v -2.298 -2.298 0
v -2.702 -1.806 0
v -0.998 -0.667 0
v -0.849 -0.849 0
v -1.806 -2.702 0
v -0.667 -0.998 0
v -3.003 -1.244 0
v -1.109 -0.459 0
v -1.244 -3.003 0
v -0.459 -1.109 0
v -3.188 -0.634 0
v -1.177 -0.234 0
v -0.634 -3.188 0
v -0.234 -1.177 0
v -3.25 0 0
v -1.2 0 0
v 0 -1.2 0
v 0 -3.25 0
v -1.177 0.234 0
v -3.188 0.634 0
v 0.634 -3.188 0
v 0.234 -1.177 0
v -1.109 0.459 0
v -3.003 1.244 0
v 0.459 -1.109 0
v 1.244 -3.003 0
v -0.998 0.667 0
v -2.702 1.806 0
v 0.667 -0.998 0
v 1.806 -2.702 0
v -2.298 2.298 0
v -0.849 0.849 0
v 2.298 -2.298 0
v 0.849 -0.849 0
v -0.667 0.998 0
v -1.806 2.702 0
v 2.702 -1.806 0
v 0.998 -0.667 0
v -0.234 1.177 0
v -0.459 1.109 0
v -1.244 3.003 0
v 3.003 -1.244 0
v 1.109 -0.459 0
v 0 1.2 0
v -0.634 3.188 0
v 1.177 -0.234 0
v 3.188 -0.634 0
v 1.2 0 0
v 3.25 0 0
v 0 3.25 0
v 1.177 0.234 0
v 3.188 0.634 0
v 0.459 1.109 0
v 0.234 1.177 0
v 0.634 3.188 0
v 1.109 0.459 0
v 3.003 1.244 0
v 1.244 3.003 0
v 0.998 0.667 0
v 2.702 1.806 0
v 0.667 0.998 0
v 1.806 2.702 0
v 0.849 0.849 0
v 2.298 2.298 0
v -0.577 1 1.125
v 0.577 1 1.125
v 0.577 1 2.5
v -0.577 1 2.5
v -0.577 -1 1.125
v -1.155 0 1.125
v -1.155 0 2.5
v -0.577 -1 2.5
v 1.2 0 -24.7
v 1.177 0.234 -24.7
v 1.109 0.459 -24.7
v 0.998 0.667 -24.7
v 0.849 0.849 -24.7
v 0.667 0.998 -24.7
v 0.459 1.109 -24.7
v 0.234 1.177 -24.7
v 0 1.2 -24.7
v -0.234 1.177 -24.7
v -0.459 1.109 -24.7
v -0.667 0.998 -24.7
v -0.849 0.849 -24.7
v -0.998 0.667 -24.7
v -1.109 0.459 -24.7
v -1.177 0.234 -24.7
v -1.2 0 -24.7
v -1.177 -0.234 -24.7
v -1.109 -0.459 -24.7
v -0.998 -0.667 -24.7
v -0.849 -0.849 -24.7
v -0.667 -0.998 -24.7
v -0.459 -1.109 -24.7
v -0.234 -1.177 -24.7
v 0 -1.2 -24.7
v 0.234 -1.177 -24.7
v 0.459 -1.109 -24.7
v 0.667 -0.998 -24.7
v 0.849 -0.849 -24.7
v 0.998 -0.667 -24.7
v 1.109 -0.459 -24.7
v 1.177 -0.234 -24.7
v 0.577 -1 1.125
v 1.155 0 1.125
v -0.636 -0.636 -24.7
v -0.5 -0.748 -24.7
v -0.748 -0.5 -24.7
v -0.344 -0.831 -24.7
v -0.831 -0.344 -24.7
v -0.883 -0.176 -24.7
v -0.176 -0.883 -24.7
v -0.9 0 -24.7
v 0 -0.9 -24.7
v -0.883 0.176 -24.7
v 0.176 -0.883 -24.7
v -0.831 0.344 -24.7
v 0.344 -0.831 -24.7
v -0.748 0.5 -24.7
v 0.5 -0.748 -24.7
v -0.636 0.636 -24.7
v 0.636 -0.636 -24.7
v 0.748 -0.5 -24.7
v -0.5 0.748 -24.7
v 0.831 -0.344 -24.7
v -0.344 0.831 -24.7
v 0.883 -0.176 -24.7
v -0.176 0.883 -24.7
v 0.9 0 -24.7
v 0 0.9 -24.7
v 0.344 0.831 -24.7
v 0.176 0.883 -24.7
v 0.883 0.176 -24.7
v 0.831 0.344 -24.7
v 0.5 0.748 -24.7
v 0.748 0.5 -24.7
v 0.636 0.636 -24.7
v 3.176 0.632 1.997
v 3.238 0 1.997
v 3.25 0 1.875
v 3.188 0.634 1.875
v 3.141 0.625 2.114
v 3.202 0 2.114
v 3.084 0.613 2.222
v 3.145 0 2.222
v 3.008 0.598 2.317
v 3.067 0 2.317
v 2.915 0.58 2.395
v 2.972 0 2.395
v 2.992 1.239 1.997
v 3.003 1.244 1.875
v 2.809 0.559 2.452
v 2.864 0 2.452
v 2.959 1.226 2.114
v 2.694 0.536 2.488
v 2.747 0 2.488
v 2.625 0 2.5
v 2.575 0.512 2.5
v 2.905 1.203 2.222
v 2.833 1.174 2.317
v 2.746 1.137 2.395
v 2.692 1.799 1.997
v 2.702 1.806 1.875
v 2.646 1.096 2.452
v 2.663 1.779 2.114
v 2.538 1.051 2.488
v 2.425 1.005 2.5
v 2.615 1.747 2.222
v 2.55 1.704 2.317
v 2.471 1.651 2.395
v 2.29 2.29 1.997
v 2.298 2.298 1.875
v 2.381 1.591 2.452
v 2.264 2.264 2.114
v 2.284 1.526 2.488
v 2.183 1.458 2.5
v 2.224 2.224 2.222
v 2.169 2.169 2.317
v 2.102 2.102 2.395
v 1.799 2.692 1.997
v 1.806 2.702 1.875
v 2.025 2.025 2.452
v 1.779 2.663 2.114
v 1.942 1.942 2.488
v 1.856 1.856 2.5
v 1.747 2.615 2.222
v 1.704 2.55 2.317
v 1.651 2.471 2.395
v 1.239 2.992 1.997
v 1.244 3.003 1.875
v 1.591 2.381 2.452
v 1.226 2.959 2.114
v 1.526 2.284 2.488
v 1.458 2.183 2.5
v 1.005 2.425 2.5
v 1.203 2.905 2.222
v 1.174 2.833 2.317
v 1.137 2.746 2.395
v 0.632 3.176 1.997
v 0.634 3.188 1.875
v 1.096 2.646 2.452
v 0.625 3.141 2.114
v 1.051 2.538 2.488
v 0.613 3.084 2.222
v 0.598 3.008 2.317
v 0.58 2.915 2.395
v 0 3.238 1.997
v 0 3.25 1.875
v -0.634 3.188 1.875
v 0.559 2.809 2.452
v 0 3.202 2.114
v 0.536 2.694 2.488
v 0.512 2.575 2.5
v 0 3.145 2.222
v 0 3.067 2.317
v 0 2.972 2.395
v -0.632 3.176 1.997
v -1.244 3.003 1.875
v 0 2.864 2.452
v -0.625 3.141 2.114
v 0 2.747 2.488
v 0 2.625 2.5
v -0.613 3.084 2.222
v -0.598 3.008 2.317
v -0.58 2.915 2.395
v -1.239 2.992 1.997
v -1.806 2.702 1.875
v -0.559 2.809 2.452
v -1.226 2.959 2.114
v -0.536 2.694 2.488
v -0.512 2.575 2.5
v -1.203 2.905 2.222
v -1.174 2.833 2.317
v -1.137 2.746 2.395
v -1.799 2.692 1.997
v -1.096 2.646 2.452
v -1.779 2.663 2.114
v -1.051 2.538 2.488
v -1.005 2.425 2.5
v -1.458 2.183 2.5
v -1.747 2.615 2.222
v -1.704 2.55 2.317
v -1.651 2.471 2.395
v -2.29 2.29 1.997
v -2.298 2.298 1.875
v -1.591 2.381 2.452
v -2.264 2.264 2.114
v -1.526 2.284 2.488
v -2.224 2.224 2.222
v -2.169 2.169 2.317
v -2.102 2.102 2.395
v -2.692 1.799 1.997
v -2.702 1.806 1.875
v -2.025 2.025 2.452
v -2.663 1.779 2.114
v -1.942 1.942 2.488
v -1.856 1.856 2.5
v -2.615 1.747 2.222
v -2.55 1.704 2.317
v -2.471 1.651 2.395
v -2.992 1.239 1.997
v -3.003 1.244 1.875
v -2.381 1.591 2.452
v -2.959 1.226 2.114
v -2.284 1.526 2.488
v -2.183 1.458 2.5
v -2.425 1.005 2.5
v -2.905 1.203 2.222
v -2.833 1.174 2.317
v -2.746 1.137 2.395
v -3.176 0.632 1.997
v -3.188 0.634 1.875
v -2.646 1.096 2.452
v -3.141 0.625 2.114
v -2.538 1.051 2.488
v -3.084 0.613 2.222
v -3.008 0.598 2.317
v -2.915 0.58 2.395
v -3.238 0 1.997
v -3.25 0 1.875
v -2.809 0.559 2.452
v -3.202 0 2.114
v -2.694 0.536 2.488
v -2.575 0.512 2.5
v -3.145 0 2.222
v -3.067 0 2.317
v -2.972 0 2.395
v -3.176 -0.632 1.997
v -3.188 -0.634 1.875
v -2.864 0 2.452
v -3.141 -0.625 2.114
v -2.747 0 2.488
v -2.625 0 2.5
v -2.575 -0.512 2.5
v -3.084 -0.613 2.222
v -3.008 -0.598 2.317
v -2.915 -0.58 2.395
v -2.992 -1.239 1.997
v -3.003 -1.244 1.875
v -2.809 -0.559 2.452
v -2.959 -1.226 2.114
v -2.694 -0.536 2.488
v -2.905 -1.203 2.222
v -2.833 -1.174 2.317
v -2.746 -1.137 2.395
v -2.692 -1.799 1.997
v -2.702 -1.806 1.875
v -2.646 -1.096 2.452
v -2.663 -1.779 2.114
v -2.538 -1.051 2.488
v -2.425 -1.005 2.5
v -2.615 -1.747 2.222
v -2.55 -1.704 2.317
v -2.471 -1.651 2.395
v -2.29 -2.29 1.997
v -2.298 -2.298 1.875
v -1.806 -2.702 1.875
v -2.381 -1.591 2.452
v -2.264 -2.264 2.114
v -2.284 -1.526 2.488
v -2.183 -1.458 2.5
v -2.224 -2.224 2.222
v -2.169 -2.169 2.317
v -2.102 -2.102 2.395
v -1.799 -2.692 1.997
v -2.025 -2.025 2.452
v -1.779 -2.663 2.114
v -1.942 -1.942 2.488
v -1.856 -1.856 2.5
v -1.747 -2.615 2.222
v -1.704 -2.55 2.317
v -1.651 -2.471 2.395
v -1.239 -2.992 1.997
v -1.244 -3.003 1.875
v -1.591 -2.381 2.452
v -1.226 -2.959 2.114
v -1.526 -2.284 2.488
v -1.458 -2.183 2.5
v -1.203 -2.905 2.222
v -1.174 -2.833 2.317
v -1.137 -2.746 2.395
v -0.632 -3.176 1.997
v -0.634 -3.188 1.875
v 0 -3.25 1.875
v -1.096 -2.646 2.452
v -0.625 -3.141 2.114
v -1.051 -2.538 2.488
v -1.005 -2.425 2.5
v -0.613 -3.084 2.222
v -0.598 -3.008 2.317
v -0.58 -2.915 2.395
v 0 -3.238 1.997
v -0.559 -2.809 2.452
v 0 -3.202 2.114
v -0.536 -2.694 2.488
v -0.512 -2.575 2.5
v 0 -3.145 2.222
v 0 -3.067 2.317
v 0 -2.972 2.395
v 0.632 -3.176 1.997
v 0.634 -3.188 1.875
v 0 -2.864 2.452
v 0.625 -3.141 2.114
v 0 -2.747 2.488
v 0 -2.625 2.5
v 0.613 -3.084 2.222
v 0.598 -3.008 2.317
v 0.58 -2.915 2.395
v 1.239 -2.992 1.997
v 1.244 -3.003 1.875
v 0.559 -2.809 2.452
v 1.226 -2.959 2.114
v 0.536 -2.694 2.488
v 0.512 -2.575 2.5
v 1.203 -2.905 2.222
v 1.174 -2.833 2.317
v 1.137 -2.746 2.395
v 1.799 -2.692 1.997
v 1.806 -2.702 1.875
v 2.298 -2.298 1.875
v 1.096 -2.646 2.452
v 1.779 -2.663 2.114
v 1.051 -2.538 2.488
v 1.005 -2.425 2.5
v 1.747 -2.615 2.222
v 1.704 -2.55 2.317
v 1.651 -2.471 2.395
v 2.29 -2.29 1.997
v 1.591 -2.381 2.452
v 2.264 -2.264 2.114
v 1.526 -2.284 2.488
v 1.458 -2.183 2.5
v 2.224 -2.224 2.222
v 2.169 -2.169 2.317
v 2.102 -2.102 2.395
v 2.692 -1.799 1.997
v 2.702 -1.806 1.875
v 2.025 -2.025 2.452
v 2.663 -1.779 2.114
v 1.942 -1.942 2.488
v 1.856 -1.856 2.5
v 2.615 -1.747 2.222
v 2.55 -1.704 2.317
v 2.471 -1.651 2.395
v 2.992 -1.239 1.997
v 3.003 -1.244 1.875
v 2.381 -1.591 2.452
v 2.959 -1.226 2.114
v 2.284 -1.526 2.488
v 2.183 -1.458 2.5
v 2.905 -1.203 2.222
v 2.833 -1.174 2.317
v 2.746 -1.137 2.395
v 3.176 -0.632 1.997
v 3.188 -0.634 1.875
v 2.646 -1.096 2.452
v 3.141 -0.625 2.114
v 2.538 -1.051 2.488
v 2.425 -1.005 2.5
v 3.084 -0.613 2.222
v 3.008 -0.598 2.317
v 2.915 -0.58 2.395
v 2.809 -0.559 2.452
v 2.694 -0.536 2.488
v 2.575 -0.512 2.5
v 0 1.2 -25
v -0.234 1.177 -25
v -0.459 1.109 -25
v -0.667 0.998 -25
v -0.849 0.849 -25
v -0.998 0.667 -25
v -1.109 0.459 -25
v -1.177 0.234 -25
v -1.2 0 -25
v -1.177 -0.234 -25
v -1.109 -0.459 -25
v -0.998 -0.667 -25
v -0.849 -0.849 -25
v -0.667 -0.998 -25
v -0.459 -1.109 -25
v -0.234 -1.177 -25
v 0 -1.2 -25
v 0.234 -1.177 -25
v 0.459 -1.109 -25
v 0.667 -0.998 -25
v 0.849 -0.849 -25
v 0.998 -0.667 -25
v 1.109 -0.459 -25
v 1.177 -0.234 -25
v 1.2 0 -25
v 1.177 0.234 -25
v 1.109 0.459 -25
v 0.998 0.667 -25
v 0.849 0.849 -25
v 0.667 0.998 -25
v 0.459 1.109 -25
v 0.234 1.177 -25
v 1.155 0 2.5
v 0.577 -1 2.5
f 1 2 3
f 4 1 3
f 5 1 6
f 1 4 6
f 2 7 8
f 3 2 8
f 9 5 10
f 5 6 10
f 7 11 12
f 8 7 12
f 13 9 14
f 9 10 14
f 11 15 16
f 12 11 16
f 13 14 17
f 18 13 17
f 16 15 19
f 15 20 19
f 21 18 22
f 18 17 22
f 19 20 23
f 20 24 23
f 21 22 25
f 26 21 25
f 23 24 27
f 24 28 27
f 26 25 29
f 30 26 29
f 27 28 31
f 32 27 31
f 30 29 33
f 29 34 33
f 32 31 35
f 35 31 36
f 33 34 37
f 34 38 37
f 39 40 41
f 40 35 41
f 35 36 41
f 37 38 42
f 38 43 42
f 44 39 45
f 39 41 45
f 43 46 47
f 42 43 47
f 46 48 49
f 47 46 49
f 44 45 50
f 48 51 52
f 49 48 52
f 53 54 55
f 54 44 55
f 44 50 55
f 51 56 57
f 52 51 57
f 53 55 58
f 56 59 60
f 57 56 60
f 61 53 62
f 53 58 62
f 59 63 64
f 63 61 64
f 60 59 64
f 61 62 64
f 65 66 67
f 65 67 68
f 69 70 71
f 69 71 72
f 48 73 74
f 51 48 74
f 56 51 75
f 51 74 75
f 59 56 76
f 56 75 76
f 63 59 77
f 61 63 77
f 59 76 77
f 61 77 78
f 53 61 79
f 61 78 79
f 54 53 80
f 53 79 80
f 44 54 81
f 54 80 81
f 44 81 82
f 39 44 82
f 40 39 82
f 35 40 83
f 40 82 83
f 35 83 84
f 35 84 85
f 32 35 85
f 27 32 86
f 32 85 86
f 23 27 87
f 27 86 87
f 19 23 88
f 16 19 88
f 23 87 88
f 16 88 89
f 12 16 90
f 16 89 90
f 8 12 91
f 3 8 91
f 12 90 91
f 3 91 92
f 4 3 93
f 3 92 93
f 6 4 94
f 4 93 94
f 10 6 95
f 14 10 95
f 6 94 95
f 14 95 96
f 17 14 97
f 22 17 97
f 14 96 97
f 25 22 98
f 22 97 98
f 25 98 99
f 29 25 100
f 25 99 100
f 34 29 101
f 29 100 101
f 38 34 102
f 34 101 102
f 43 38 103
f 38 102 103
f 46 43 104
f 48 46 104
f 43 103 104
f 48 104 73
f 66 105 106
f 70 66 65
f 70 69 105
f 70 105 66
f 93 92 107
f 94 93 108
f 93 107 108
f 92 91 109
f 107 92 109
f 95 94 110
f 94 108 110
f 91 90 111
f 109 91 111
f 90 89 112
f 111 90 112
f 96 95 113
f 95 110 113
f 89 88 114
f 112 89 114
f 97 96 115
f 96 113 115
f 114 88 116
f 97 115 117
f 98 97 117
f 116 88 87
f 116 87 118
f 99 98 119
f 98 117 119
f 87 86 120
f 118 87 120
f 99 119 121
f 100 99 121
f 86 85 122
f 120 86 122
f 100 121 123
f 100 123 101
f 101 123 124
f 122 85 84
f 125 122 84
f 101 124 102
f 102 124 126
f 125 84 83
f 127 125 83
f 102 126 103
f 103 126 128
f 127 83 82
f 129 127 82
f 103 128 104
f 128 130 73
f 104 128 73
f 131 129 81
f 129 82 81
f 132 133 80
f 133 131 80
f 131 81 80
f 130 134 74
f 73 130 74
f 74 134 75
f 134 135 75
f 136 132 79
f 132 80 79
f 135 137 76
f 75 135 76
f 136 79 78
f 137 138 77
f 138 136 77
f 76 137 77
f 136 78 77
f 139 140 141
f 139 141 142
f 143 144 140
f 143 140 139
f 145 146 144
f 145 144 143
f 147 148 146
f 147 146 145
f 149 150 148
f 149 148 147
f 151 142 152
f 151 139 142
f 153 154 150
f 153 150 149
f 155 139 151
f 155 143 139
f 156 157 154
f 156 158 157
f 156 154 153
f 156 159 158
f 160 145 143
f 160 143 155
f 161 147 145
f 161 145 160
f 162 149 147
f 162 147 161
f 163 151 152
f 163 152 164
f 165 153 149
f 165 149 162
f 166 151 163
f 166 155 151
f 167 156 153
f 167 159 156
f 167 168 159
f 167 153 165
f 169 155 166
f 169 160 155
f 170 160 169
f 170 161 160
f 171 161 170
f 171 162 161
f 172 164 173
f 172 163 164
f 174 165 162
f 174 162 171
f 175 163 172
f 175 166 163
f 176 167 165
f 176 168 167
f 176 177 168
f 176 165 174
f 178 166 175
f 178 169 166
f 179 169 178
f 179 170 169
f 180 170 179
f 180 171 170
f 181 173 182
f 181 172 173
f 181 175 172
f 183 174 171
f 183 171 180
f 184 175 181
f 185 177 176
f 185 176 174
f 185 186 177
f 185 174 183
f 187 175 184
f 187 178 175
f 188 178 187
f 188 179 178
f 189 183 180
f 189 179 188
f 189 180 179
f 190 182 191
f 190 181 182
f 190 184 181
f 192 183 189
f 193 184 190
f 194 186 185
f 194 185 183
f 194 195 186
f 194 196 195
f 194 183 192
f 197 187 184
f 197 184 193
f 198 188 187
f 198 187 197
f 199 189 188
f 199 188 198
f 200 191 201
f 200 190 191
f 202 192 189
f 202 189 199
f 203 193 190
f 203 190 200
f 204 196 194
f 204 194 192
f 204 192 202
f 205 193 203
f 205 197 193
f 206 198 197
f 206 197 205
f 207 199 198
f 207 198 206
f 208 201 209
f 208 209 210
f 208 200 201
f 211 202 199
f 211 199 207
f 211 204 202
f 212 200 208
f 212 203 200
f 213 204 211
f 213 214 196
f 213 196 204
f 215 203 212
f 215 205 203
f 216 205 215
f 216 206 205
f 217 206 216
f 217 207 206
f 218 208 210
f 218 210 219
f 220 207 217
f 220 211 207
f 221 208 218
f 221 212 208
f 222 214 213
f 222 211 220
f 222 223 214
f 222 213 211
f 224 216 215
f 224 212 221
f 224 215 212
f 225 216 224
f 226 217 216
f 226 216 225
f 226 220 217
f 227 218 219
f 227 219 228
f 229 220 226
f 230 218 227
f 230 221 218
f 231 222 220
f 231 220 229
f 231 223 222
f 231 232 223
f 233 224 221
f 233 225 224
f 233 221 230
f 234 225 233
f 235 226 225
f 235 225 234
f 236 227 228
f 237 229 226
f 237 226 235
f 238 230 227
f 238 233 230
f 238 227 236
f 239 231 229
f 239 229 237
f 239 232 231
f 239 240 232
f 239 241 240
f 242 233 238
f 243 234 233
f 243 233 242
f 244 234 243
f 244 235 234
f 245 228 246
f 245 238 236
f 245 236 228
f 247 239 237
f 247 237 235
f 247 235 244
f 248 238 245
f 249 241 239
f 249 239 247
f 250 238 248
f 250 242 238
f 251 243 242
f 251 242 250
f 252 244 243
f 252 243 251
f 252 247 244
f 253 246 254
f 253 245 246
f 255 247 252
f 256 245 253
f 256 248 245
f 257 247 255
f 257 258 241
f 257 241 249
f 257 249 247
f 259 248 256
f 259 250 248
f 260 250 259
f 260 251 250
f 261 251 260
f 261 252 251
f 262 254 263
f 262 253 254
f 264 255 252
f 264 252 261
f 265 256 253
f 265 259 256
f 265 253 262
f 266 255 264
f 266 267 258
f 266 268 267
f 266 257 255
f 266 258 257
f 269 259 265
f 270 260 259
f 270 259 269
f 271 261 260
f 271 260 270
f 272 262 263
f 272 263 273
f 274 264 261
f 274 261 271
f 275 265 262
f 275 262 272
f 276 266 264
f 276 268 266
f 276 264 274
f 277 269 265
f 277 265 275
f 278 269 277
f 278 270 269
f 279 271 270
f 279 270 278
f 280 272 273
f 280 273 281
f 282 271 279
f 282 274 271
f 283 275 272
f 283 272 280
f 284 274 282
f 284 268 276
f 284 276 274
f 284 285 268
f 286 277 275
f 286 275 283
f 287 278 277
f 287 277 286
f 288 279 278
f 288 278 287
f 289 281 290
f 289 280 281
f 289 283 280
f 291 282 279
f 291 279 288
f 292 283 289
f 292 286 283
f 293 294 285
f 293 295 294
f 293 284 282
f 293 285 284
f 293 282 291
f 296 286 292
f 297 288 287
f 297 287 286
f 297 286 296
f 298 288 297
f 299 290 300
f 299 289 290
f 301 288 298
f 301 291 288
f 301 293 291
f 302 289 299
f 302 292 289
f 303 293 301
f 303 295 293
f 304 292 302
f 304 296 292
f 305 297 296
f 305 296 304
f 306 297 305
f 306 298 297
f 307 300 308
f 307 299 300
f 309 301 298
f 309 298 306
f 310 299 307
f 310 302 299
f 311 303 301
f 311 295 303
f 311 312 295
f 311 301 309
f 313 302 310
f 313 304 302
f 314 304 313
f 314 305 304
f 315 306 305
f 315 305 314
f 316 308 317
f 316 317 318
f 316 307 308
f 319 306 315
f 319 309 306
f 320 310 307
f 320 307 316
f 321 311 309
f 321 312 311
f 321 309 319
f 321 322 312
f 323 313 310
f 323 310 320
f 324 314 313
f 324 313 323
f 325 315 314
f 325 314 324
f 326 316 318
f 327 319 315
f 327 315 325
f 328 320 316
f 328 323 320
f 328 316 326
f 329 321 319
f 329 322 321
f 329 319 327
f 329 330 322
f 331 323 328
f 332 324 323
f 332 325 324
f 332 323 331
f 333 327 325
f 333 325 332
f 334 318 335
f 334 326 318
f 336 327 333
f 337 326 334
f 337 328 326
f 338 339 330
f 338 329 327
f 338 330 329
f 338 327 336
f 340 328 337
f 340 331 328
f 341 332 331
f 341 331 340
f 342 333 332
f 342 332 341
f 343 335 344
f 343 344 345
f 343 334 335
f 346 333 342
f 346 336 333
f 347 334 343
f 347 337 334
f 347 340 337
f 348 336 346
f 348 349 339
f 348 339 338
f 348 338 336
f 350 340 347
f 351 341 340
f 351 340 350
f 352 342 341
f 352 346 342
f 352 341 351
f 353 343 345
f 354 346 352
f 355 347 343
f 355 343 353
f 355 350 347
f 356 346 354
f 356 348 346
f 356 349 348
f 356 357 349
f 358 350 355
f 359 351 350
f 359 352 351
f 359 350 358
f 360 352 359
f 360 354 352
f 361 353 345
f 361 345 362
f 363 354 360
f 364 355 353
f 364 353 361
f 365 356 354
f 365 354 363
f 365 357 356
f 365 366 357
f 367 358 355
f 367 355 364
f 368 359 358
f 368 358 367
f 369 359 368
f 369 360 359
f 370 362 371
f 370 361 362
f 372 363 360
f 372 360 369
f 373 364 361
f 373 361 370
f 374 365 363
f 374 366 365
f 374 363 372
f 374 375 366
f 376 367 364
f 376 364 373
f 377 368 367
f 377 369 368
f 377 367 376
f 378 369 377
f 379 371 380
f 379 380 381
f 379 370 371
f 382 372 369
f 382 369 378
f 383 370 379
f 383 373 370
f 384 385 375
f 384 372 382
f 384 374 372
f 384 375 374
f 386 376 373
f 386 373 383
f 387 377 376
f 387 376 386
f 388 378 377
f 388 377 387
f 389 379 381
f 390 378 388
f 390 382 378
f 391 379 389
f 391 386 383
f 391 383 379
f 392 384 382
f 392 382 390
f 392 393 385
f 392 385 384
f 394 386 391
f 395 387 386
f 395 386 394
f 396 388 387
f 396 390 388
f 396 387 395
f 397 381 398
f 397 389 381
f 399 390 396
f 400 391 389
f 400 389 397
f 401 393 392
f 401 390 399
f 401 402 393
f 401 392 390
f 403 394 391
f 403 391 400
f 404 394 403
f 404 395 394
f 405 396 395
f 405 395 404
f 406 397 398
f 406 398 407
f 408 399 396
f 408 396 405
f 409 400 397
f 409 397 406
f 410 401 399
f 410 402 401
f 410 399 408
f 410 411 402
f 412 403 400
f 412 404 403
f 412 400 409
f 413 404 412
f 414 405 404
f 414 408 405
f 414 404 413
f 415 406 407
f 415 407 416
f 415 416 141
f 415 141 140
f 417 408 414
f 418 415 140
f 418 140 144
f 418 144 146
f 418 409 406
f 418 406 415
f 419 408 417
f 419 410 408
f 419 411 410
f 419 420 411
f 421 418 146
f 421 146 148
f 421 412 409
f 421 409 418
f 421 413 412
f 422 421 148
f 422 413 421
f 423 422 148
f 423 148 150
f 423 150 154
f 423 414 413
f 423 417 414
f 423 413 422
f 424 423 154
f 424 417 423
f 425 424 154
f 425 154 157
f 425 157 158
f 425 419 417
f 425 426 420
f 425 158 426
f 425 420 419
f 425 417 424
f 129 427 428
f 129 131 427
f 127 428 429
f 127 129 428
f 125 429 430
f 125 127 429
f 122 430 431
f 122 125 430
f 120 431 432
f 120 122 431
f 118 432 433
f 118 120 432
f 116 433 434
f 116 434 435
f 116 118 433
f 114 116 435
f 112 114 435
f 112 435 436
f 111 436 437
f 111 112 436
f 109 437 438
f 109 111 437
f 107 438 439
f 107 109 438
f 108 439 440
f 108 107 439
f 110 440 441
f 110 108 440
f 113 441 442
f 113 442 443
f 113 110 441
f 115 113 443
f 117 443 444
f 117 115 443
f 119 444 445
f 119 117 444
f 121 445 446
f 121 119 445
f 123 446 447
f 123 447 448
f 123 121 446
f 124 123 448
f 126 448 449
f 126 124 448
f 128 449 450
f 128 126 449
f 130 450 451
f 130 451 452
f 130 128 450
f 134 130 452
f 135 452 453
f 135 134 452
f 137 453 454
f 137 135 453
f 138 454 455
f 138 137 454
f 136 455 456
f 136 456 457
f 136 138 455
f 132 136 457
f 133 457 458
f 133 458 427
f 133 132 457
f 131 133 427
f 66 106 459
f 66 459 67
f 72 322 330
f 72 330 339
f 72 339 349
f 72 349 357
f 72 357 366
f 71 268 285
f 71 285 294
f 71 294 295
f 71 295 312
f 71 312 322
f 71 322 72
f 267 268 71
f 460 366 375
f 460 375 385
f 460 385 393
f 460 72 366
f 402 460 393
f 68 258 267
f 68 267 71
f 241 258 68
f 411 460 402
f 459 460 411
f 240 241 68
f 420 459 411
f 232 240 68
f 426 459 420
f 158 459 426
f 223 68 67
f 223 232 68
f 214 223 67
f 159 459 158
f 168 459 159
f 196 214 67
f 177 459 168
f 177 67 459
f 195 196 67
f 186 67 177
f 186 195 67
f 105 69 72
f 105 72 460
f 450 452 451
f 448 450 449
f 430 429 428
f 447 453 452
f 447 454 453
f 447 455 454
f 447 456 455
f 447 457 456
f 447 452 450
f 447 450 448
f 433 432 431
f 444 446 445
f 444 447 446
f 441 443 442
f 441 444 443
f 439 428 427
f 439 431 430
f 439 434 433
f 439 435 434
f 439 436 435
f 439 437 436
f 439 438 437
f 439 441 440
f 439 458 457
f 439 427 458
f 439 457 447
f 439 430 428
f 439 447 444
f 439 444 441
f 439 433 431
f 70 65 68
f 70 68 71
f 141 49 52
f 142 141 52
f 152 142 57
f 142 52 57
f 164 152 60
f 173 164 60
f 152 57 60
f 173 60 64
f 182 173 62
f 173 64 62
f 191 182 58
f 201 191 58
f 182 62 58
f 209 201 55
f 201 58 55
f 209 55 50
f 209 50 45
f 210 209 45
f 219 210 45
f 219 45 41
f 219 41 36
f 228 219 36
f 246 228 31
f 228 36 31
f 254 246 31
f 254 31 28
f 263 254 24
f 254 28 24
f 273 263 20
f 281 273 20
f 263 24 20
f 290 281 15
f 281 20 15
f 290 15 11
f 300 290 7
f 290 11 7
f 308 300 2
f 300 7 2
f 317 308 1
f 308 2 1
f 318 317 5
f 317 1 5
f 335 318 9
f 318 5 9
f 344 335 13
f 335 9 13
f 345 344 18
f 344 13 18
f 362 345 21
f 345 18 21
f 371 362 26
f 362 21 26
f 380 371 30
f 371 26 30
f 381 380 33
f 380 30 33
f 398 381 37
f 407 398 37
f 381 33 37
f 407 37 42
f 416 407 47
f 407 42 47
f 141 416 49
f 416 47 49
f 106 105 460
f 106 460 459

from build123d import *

# Parameters (mm, degrees)
F_0105_CYLINDER_SKETCH_R    = 3.25
F_0105_CYLINDER_DEPTH       = 2.5
F_0106_FILLET_R             = 0.625
F_0107_EXTRUDE_DEPTH        = 1.385
F_0107_EXTRUDE_ROTATE_ANGLE = 120
F_0110_CYLINDER_SKETCH_R    = 1.2
F_0110_CYLINDER_DEPTH       = 24.7
F_0111_CONE_ROTATE_ANGLE    = 90


with BuildPart() as part:
    # 0105_cylinder_Sketch → 0105_cylinder (new body)
    with BuildSketch(Plane.XY):
        Circle(F_0105_CYLINDER_SKETCH_R)
    extrude(amount=F_0105_CYLINDER_DEPTH)

    # 0106_fillet
    f_0106_fillet_edges = [part.edges().sort_by_distance(p)[0] for p in [
        (-3.25, 0, 2.5),
    ]]
    fillet(f_0106_fillet_edges, radius=F_0106_FILLET_R)


with BuildPart() as body_2:
    # 0107_extrude_Sketch → 0107_extrude (new body)
    with BuildSketch(Plane.XY):
        Polygon((0, 0), (1.154700538, 0), (1.732050808, 1), (1.154700538, 2), (0, 2), (-0.577350269, 1), align=None)
    extrude(amount=F_0107_EXTRUDE_DEPTH)


with BuildPart() as body_2_1:
    # 0107_extrude_Rotate: read off the stored shape, not the designer's step
    # 0107_extrude_Rotate: moved
    add(body_2.part.rotate(Axis((0, 0, 0), (0, 0, 1)), F_0107_EXTRUDE_ROTATE_ANGLE))


with BuildPart() as body_2_2:
    # 0107_extrude_Translate: moved
    add(body_2_1.part.moved(Location((1.154700538, 0, 1.125))))


with BuildPart() as part_1:
    add(part.part)

    # 0109_sub: cut body 2
    add(body_2_2.part, mode=Mode.SUBTRACT)


with BuildPart() as body_2_2_1:
    # 0110_cylinder_Sketch → 0110_cylinder (new body)
    with BuildSketch(Plane.XY):
        Circle(F_0110_CYLINDER_SKETCH_R)
    extrude(amount=F_0110_CYLINDER_DEPTH)


with BuildPart() as body_2_2_2:
    # 0110_cylinder_Translate: moved
    add(body_2_2_1.part.moved(Location((0, 0, -24.7))))


with BuildPart() as body_3:
    # 0111_cone_Sketch → 0111_cone (revolve)
    with BuildSketch(Plane.XY, mode=Mode.PRIVATE) as f_0111_cone_sk:
        Polygon((0, 0), (1.2, 0), (0.9, 0.3), (0, 0.3), align=None)
    revolve(f_0111_cone_sk.sketch.rotate(Axis((0, -100, 0), (0, 1, 0)), 90), axis=Axis((0, -100, 0), (0, 1, 0)))


with BuildPart() as body_3_1:
    # 0111_cone_Rotate: moved
    add(body_3.part.rotate(Axis((0, 0, 0), (1, 0, 0)), F_0111_CONE_ROTATE_ANGLE))


with BuildPart() as body_3_2:
    # 0111_cone_Translate: moved
    add(body_3_1.part.moved(Location((0, 0, -25))))


with BuildPart() as body_2_2_3:
    add(body_2_2_2.part)

    # 0113_add: union body 3
    add(body_3_2.part)


with BuildPart() as part_2:
    add(part_1.part)

    # 0114_add: union body 2 2
    add(body_2_2_3.part)


solid = part_2.part
